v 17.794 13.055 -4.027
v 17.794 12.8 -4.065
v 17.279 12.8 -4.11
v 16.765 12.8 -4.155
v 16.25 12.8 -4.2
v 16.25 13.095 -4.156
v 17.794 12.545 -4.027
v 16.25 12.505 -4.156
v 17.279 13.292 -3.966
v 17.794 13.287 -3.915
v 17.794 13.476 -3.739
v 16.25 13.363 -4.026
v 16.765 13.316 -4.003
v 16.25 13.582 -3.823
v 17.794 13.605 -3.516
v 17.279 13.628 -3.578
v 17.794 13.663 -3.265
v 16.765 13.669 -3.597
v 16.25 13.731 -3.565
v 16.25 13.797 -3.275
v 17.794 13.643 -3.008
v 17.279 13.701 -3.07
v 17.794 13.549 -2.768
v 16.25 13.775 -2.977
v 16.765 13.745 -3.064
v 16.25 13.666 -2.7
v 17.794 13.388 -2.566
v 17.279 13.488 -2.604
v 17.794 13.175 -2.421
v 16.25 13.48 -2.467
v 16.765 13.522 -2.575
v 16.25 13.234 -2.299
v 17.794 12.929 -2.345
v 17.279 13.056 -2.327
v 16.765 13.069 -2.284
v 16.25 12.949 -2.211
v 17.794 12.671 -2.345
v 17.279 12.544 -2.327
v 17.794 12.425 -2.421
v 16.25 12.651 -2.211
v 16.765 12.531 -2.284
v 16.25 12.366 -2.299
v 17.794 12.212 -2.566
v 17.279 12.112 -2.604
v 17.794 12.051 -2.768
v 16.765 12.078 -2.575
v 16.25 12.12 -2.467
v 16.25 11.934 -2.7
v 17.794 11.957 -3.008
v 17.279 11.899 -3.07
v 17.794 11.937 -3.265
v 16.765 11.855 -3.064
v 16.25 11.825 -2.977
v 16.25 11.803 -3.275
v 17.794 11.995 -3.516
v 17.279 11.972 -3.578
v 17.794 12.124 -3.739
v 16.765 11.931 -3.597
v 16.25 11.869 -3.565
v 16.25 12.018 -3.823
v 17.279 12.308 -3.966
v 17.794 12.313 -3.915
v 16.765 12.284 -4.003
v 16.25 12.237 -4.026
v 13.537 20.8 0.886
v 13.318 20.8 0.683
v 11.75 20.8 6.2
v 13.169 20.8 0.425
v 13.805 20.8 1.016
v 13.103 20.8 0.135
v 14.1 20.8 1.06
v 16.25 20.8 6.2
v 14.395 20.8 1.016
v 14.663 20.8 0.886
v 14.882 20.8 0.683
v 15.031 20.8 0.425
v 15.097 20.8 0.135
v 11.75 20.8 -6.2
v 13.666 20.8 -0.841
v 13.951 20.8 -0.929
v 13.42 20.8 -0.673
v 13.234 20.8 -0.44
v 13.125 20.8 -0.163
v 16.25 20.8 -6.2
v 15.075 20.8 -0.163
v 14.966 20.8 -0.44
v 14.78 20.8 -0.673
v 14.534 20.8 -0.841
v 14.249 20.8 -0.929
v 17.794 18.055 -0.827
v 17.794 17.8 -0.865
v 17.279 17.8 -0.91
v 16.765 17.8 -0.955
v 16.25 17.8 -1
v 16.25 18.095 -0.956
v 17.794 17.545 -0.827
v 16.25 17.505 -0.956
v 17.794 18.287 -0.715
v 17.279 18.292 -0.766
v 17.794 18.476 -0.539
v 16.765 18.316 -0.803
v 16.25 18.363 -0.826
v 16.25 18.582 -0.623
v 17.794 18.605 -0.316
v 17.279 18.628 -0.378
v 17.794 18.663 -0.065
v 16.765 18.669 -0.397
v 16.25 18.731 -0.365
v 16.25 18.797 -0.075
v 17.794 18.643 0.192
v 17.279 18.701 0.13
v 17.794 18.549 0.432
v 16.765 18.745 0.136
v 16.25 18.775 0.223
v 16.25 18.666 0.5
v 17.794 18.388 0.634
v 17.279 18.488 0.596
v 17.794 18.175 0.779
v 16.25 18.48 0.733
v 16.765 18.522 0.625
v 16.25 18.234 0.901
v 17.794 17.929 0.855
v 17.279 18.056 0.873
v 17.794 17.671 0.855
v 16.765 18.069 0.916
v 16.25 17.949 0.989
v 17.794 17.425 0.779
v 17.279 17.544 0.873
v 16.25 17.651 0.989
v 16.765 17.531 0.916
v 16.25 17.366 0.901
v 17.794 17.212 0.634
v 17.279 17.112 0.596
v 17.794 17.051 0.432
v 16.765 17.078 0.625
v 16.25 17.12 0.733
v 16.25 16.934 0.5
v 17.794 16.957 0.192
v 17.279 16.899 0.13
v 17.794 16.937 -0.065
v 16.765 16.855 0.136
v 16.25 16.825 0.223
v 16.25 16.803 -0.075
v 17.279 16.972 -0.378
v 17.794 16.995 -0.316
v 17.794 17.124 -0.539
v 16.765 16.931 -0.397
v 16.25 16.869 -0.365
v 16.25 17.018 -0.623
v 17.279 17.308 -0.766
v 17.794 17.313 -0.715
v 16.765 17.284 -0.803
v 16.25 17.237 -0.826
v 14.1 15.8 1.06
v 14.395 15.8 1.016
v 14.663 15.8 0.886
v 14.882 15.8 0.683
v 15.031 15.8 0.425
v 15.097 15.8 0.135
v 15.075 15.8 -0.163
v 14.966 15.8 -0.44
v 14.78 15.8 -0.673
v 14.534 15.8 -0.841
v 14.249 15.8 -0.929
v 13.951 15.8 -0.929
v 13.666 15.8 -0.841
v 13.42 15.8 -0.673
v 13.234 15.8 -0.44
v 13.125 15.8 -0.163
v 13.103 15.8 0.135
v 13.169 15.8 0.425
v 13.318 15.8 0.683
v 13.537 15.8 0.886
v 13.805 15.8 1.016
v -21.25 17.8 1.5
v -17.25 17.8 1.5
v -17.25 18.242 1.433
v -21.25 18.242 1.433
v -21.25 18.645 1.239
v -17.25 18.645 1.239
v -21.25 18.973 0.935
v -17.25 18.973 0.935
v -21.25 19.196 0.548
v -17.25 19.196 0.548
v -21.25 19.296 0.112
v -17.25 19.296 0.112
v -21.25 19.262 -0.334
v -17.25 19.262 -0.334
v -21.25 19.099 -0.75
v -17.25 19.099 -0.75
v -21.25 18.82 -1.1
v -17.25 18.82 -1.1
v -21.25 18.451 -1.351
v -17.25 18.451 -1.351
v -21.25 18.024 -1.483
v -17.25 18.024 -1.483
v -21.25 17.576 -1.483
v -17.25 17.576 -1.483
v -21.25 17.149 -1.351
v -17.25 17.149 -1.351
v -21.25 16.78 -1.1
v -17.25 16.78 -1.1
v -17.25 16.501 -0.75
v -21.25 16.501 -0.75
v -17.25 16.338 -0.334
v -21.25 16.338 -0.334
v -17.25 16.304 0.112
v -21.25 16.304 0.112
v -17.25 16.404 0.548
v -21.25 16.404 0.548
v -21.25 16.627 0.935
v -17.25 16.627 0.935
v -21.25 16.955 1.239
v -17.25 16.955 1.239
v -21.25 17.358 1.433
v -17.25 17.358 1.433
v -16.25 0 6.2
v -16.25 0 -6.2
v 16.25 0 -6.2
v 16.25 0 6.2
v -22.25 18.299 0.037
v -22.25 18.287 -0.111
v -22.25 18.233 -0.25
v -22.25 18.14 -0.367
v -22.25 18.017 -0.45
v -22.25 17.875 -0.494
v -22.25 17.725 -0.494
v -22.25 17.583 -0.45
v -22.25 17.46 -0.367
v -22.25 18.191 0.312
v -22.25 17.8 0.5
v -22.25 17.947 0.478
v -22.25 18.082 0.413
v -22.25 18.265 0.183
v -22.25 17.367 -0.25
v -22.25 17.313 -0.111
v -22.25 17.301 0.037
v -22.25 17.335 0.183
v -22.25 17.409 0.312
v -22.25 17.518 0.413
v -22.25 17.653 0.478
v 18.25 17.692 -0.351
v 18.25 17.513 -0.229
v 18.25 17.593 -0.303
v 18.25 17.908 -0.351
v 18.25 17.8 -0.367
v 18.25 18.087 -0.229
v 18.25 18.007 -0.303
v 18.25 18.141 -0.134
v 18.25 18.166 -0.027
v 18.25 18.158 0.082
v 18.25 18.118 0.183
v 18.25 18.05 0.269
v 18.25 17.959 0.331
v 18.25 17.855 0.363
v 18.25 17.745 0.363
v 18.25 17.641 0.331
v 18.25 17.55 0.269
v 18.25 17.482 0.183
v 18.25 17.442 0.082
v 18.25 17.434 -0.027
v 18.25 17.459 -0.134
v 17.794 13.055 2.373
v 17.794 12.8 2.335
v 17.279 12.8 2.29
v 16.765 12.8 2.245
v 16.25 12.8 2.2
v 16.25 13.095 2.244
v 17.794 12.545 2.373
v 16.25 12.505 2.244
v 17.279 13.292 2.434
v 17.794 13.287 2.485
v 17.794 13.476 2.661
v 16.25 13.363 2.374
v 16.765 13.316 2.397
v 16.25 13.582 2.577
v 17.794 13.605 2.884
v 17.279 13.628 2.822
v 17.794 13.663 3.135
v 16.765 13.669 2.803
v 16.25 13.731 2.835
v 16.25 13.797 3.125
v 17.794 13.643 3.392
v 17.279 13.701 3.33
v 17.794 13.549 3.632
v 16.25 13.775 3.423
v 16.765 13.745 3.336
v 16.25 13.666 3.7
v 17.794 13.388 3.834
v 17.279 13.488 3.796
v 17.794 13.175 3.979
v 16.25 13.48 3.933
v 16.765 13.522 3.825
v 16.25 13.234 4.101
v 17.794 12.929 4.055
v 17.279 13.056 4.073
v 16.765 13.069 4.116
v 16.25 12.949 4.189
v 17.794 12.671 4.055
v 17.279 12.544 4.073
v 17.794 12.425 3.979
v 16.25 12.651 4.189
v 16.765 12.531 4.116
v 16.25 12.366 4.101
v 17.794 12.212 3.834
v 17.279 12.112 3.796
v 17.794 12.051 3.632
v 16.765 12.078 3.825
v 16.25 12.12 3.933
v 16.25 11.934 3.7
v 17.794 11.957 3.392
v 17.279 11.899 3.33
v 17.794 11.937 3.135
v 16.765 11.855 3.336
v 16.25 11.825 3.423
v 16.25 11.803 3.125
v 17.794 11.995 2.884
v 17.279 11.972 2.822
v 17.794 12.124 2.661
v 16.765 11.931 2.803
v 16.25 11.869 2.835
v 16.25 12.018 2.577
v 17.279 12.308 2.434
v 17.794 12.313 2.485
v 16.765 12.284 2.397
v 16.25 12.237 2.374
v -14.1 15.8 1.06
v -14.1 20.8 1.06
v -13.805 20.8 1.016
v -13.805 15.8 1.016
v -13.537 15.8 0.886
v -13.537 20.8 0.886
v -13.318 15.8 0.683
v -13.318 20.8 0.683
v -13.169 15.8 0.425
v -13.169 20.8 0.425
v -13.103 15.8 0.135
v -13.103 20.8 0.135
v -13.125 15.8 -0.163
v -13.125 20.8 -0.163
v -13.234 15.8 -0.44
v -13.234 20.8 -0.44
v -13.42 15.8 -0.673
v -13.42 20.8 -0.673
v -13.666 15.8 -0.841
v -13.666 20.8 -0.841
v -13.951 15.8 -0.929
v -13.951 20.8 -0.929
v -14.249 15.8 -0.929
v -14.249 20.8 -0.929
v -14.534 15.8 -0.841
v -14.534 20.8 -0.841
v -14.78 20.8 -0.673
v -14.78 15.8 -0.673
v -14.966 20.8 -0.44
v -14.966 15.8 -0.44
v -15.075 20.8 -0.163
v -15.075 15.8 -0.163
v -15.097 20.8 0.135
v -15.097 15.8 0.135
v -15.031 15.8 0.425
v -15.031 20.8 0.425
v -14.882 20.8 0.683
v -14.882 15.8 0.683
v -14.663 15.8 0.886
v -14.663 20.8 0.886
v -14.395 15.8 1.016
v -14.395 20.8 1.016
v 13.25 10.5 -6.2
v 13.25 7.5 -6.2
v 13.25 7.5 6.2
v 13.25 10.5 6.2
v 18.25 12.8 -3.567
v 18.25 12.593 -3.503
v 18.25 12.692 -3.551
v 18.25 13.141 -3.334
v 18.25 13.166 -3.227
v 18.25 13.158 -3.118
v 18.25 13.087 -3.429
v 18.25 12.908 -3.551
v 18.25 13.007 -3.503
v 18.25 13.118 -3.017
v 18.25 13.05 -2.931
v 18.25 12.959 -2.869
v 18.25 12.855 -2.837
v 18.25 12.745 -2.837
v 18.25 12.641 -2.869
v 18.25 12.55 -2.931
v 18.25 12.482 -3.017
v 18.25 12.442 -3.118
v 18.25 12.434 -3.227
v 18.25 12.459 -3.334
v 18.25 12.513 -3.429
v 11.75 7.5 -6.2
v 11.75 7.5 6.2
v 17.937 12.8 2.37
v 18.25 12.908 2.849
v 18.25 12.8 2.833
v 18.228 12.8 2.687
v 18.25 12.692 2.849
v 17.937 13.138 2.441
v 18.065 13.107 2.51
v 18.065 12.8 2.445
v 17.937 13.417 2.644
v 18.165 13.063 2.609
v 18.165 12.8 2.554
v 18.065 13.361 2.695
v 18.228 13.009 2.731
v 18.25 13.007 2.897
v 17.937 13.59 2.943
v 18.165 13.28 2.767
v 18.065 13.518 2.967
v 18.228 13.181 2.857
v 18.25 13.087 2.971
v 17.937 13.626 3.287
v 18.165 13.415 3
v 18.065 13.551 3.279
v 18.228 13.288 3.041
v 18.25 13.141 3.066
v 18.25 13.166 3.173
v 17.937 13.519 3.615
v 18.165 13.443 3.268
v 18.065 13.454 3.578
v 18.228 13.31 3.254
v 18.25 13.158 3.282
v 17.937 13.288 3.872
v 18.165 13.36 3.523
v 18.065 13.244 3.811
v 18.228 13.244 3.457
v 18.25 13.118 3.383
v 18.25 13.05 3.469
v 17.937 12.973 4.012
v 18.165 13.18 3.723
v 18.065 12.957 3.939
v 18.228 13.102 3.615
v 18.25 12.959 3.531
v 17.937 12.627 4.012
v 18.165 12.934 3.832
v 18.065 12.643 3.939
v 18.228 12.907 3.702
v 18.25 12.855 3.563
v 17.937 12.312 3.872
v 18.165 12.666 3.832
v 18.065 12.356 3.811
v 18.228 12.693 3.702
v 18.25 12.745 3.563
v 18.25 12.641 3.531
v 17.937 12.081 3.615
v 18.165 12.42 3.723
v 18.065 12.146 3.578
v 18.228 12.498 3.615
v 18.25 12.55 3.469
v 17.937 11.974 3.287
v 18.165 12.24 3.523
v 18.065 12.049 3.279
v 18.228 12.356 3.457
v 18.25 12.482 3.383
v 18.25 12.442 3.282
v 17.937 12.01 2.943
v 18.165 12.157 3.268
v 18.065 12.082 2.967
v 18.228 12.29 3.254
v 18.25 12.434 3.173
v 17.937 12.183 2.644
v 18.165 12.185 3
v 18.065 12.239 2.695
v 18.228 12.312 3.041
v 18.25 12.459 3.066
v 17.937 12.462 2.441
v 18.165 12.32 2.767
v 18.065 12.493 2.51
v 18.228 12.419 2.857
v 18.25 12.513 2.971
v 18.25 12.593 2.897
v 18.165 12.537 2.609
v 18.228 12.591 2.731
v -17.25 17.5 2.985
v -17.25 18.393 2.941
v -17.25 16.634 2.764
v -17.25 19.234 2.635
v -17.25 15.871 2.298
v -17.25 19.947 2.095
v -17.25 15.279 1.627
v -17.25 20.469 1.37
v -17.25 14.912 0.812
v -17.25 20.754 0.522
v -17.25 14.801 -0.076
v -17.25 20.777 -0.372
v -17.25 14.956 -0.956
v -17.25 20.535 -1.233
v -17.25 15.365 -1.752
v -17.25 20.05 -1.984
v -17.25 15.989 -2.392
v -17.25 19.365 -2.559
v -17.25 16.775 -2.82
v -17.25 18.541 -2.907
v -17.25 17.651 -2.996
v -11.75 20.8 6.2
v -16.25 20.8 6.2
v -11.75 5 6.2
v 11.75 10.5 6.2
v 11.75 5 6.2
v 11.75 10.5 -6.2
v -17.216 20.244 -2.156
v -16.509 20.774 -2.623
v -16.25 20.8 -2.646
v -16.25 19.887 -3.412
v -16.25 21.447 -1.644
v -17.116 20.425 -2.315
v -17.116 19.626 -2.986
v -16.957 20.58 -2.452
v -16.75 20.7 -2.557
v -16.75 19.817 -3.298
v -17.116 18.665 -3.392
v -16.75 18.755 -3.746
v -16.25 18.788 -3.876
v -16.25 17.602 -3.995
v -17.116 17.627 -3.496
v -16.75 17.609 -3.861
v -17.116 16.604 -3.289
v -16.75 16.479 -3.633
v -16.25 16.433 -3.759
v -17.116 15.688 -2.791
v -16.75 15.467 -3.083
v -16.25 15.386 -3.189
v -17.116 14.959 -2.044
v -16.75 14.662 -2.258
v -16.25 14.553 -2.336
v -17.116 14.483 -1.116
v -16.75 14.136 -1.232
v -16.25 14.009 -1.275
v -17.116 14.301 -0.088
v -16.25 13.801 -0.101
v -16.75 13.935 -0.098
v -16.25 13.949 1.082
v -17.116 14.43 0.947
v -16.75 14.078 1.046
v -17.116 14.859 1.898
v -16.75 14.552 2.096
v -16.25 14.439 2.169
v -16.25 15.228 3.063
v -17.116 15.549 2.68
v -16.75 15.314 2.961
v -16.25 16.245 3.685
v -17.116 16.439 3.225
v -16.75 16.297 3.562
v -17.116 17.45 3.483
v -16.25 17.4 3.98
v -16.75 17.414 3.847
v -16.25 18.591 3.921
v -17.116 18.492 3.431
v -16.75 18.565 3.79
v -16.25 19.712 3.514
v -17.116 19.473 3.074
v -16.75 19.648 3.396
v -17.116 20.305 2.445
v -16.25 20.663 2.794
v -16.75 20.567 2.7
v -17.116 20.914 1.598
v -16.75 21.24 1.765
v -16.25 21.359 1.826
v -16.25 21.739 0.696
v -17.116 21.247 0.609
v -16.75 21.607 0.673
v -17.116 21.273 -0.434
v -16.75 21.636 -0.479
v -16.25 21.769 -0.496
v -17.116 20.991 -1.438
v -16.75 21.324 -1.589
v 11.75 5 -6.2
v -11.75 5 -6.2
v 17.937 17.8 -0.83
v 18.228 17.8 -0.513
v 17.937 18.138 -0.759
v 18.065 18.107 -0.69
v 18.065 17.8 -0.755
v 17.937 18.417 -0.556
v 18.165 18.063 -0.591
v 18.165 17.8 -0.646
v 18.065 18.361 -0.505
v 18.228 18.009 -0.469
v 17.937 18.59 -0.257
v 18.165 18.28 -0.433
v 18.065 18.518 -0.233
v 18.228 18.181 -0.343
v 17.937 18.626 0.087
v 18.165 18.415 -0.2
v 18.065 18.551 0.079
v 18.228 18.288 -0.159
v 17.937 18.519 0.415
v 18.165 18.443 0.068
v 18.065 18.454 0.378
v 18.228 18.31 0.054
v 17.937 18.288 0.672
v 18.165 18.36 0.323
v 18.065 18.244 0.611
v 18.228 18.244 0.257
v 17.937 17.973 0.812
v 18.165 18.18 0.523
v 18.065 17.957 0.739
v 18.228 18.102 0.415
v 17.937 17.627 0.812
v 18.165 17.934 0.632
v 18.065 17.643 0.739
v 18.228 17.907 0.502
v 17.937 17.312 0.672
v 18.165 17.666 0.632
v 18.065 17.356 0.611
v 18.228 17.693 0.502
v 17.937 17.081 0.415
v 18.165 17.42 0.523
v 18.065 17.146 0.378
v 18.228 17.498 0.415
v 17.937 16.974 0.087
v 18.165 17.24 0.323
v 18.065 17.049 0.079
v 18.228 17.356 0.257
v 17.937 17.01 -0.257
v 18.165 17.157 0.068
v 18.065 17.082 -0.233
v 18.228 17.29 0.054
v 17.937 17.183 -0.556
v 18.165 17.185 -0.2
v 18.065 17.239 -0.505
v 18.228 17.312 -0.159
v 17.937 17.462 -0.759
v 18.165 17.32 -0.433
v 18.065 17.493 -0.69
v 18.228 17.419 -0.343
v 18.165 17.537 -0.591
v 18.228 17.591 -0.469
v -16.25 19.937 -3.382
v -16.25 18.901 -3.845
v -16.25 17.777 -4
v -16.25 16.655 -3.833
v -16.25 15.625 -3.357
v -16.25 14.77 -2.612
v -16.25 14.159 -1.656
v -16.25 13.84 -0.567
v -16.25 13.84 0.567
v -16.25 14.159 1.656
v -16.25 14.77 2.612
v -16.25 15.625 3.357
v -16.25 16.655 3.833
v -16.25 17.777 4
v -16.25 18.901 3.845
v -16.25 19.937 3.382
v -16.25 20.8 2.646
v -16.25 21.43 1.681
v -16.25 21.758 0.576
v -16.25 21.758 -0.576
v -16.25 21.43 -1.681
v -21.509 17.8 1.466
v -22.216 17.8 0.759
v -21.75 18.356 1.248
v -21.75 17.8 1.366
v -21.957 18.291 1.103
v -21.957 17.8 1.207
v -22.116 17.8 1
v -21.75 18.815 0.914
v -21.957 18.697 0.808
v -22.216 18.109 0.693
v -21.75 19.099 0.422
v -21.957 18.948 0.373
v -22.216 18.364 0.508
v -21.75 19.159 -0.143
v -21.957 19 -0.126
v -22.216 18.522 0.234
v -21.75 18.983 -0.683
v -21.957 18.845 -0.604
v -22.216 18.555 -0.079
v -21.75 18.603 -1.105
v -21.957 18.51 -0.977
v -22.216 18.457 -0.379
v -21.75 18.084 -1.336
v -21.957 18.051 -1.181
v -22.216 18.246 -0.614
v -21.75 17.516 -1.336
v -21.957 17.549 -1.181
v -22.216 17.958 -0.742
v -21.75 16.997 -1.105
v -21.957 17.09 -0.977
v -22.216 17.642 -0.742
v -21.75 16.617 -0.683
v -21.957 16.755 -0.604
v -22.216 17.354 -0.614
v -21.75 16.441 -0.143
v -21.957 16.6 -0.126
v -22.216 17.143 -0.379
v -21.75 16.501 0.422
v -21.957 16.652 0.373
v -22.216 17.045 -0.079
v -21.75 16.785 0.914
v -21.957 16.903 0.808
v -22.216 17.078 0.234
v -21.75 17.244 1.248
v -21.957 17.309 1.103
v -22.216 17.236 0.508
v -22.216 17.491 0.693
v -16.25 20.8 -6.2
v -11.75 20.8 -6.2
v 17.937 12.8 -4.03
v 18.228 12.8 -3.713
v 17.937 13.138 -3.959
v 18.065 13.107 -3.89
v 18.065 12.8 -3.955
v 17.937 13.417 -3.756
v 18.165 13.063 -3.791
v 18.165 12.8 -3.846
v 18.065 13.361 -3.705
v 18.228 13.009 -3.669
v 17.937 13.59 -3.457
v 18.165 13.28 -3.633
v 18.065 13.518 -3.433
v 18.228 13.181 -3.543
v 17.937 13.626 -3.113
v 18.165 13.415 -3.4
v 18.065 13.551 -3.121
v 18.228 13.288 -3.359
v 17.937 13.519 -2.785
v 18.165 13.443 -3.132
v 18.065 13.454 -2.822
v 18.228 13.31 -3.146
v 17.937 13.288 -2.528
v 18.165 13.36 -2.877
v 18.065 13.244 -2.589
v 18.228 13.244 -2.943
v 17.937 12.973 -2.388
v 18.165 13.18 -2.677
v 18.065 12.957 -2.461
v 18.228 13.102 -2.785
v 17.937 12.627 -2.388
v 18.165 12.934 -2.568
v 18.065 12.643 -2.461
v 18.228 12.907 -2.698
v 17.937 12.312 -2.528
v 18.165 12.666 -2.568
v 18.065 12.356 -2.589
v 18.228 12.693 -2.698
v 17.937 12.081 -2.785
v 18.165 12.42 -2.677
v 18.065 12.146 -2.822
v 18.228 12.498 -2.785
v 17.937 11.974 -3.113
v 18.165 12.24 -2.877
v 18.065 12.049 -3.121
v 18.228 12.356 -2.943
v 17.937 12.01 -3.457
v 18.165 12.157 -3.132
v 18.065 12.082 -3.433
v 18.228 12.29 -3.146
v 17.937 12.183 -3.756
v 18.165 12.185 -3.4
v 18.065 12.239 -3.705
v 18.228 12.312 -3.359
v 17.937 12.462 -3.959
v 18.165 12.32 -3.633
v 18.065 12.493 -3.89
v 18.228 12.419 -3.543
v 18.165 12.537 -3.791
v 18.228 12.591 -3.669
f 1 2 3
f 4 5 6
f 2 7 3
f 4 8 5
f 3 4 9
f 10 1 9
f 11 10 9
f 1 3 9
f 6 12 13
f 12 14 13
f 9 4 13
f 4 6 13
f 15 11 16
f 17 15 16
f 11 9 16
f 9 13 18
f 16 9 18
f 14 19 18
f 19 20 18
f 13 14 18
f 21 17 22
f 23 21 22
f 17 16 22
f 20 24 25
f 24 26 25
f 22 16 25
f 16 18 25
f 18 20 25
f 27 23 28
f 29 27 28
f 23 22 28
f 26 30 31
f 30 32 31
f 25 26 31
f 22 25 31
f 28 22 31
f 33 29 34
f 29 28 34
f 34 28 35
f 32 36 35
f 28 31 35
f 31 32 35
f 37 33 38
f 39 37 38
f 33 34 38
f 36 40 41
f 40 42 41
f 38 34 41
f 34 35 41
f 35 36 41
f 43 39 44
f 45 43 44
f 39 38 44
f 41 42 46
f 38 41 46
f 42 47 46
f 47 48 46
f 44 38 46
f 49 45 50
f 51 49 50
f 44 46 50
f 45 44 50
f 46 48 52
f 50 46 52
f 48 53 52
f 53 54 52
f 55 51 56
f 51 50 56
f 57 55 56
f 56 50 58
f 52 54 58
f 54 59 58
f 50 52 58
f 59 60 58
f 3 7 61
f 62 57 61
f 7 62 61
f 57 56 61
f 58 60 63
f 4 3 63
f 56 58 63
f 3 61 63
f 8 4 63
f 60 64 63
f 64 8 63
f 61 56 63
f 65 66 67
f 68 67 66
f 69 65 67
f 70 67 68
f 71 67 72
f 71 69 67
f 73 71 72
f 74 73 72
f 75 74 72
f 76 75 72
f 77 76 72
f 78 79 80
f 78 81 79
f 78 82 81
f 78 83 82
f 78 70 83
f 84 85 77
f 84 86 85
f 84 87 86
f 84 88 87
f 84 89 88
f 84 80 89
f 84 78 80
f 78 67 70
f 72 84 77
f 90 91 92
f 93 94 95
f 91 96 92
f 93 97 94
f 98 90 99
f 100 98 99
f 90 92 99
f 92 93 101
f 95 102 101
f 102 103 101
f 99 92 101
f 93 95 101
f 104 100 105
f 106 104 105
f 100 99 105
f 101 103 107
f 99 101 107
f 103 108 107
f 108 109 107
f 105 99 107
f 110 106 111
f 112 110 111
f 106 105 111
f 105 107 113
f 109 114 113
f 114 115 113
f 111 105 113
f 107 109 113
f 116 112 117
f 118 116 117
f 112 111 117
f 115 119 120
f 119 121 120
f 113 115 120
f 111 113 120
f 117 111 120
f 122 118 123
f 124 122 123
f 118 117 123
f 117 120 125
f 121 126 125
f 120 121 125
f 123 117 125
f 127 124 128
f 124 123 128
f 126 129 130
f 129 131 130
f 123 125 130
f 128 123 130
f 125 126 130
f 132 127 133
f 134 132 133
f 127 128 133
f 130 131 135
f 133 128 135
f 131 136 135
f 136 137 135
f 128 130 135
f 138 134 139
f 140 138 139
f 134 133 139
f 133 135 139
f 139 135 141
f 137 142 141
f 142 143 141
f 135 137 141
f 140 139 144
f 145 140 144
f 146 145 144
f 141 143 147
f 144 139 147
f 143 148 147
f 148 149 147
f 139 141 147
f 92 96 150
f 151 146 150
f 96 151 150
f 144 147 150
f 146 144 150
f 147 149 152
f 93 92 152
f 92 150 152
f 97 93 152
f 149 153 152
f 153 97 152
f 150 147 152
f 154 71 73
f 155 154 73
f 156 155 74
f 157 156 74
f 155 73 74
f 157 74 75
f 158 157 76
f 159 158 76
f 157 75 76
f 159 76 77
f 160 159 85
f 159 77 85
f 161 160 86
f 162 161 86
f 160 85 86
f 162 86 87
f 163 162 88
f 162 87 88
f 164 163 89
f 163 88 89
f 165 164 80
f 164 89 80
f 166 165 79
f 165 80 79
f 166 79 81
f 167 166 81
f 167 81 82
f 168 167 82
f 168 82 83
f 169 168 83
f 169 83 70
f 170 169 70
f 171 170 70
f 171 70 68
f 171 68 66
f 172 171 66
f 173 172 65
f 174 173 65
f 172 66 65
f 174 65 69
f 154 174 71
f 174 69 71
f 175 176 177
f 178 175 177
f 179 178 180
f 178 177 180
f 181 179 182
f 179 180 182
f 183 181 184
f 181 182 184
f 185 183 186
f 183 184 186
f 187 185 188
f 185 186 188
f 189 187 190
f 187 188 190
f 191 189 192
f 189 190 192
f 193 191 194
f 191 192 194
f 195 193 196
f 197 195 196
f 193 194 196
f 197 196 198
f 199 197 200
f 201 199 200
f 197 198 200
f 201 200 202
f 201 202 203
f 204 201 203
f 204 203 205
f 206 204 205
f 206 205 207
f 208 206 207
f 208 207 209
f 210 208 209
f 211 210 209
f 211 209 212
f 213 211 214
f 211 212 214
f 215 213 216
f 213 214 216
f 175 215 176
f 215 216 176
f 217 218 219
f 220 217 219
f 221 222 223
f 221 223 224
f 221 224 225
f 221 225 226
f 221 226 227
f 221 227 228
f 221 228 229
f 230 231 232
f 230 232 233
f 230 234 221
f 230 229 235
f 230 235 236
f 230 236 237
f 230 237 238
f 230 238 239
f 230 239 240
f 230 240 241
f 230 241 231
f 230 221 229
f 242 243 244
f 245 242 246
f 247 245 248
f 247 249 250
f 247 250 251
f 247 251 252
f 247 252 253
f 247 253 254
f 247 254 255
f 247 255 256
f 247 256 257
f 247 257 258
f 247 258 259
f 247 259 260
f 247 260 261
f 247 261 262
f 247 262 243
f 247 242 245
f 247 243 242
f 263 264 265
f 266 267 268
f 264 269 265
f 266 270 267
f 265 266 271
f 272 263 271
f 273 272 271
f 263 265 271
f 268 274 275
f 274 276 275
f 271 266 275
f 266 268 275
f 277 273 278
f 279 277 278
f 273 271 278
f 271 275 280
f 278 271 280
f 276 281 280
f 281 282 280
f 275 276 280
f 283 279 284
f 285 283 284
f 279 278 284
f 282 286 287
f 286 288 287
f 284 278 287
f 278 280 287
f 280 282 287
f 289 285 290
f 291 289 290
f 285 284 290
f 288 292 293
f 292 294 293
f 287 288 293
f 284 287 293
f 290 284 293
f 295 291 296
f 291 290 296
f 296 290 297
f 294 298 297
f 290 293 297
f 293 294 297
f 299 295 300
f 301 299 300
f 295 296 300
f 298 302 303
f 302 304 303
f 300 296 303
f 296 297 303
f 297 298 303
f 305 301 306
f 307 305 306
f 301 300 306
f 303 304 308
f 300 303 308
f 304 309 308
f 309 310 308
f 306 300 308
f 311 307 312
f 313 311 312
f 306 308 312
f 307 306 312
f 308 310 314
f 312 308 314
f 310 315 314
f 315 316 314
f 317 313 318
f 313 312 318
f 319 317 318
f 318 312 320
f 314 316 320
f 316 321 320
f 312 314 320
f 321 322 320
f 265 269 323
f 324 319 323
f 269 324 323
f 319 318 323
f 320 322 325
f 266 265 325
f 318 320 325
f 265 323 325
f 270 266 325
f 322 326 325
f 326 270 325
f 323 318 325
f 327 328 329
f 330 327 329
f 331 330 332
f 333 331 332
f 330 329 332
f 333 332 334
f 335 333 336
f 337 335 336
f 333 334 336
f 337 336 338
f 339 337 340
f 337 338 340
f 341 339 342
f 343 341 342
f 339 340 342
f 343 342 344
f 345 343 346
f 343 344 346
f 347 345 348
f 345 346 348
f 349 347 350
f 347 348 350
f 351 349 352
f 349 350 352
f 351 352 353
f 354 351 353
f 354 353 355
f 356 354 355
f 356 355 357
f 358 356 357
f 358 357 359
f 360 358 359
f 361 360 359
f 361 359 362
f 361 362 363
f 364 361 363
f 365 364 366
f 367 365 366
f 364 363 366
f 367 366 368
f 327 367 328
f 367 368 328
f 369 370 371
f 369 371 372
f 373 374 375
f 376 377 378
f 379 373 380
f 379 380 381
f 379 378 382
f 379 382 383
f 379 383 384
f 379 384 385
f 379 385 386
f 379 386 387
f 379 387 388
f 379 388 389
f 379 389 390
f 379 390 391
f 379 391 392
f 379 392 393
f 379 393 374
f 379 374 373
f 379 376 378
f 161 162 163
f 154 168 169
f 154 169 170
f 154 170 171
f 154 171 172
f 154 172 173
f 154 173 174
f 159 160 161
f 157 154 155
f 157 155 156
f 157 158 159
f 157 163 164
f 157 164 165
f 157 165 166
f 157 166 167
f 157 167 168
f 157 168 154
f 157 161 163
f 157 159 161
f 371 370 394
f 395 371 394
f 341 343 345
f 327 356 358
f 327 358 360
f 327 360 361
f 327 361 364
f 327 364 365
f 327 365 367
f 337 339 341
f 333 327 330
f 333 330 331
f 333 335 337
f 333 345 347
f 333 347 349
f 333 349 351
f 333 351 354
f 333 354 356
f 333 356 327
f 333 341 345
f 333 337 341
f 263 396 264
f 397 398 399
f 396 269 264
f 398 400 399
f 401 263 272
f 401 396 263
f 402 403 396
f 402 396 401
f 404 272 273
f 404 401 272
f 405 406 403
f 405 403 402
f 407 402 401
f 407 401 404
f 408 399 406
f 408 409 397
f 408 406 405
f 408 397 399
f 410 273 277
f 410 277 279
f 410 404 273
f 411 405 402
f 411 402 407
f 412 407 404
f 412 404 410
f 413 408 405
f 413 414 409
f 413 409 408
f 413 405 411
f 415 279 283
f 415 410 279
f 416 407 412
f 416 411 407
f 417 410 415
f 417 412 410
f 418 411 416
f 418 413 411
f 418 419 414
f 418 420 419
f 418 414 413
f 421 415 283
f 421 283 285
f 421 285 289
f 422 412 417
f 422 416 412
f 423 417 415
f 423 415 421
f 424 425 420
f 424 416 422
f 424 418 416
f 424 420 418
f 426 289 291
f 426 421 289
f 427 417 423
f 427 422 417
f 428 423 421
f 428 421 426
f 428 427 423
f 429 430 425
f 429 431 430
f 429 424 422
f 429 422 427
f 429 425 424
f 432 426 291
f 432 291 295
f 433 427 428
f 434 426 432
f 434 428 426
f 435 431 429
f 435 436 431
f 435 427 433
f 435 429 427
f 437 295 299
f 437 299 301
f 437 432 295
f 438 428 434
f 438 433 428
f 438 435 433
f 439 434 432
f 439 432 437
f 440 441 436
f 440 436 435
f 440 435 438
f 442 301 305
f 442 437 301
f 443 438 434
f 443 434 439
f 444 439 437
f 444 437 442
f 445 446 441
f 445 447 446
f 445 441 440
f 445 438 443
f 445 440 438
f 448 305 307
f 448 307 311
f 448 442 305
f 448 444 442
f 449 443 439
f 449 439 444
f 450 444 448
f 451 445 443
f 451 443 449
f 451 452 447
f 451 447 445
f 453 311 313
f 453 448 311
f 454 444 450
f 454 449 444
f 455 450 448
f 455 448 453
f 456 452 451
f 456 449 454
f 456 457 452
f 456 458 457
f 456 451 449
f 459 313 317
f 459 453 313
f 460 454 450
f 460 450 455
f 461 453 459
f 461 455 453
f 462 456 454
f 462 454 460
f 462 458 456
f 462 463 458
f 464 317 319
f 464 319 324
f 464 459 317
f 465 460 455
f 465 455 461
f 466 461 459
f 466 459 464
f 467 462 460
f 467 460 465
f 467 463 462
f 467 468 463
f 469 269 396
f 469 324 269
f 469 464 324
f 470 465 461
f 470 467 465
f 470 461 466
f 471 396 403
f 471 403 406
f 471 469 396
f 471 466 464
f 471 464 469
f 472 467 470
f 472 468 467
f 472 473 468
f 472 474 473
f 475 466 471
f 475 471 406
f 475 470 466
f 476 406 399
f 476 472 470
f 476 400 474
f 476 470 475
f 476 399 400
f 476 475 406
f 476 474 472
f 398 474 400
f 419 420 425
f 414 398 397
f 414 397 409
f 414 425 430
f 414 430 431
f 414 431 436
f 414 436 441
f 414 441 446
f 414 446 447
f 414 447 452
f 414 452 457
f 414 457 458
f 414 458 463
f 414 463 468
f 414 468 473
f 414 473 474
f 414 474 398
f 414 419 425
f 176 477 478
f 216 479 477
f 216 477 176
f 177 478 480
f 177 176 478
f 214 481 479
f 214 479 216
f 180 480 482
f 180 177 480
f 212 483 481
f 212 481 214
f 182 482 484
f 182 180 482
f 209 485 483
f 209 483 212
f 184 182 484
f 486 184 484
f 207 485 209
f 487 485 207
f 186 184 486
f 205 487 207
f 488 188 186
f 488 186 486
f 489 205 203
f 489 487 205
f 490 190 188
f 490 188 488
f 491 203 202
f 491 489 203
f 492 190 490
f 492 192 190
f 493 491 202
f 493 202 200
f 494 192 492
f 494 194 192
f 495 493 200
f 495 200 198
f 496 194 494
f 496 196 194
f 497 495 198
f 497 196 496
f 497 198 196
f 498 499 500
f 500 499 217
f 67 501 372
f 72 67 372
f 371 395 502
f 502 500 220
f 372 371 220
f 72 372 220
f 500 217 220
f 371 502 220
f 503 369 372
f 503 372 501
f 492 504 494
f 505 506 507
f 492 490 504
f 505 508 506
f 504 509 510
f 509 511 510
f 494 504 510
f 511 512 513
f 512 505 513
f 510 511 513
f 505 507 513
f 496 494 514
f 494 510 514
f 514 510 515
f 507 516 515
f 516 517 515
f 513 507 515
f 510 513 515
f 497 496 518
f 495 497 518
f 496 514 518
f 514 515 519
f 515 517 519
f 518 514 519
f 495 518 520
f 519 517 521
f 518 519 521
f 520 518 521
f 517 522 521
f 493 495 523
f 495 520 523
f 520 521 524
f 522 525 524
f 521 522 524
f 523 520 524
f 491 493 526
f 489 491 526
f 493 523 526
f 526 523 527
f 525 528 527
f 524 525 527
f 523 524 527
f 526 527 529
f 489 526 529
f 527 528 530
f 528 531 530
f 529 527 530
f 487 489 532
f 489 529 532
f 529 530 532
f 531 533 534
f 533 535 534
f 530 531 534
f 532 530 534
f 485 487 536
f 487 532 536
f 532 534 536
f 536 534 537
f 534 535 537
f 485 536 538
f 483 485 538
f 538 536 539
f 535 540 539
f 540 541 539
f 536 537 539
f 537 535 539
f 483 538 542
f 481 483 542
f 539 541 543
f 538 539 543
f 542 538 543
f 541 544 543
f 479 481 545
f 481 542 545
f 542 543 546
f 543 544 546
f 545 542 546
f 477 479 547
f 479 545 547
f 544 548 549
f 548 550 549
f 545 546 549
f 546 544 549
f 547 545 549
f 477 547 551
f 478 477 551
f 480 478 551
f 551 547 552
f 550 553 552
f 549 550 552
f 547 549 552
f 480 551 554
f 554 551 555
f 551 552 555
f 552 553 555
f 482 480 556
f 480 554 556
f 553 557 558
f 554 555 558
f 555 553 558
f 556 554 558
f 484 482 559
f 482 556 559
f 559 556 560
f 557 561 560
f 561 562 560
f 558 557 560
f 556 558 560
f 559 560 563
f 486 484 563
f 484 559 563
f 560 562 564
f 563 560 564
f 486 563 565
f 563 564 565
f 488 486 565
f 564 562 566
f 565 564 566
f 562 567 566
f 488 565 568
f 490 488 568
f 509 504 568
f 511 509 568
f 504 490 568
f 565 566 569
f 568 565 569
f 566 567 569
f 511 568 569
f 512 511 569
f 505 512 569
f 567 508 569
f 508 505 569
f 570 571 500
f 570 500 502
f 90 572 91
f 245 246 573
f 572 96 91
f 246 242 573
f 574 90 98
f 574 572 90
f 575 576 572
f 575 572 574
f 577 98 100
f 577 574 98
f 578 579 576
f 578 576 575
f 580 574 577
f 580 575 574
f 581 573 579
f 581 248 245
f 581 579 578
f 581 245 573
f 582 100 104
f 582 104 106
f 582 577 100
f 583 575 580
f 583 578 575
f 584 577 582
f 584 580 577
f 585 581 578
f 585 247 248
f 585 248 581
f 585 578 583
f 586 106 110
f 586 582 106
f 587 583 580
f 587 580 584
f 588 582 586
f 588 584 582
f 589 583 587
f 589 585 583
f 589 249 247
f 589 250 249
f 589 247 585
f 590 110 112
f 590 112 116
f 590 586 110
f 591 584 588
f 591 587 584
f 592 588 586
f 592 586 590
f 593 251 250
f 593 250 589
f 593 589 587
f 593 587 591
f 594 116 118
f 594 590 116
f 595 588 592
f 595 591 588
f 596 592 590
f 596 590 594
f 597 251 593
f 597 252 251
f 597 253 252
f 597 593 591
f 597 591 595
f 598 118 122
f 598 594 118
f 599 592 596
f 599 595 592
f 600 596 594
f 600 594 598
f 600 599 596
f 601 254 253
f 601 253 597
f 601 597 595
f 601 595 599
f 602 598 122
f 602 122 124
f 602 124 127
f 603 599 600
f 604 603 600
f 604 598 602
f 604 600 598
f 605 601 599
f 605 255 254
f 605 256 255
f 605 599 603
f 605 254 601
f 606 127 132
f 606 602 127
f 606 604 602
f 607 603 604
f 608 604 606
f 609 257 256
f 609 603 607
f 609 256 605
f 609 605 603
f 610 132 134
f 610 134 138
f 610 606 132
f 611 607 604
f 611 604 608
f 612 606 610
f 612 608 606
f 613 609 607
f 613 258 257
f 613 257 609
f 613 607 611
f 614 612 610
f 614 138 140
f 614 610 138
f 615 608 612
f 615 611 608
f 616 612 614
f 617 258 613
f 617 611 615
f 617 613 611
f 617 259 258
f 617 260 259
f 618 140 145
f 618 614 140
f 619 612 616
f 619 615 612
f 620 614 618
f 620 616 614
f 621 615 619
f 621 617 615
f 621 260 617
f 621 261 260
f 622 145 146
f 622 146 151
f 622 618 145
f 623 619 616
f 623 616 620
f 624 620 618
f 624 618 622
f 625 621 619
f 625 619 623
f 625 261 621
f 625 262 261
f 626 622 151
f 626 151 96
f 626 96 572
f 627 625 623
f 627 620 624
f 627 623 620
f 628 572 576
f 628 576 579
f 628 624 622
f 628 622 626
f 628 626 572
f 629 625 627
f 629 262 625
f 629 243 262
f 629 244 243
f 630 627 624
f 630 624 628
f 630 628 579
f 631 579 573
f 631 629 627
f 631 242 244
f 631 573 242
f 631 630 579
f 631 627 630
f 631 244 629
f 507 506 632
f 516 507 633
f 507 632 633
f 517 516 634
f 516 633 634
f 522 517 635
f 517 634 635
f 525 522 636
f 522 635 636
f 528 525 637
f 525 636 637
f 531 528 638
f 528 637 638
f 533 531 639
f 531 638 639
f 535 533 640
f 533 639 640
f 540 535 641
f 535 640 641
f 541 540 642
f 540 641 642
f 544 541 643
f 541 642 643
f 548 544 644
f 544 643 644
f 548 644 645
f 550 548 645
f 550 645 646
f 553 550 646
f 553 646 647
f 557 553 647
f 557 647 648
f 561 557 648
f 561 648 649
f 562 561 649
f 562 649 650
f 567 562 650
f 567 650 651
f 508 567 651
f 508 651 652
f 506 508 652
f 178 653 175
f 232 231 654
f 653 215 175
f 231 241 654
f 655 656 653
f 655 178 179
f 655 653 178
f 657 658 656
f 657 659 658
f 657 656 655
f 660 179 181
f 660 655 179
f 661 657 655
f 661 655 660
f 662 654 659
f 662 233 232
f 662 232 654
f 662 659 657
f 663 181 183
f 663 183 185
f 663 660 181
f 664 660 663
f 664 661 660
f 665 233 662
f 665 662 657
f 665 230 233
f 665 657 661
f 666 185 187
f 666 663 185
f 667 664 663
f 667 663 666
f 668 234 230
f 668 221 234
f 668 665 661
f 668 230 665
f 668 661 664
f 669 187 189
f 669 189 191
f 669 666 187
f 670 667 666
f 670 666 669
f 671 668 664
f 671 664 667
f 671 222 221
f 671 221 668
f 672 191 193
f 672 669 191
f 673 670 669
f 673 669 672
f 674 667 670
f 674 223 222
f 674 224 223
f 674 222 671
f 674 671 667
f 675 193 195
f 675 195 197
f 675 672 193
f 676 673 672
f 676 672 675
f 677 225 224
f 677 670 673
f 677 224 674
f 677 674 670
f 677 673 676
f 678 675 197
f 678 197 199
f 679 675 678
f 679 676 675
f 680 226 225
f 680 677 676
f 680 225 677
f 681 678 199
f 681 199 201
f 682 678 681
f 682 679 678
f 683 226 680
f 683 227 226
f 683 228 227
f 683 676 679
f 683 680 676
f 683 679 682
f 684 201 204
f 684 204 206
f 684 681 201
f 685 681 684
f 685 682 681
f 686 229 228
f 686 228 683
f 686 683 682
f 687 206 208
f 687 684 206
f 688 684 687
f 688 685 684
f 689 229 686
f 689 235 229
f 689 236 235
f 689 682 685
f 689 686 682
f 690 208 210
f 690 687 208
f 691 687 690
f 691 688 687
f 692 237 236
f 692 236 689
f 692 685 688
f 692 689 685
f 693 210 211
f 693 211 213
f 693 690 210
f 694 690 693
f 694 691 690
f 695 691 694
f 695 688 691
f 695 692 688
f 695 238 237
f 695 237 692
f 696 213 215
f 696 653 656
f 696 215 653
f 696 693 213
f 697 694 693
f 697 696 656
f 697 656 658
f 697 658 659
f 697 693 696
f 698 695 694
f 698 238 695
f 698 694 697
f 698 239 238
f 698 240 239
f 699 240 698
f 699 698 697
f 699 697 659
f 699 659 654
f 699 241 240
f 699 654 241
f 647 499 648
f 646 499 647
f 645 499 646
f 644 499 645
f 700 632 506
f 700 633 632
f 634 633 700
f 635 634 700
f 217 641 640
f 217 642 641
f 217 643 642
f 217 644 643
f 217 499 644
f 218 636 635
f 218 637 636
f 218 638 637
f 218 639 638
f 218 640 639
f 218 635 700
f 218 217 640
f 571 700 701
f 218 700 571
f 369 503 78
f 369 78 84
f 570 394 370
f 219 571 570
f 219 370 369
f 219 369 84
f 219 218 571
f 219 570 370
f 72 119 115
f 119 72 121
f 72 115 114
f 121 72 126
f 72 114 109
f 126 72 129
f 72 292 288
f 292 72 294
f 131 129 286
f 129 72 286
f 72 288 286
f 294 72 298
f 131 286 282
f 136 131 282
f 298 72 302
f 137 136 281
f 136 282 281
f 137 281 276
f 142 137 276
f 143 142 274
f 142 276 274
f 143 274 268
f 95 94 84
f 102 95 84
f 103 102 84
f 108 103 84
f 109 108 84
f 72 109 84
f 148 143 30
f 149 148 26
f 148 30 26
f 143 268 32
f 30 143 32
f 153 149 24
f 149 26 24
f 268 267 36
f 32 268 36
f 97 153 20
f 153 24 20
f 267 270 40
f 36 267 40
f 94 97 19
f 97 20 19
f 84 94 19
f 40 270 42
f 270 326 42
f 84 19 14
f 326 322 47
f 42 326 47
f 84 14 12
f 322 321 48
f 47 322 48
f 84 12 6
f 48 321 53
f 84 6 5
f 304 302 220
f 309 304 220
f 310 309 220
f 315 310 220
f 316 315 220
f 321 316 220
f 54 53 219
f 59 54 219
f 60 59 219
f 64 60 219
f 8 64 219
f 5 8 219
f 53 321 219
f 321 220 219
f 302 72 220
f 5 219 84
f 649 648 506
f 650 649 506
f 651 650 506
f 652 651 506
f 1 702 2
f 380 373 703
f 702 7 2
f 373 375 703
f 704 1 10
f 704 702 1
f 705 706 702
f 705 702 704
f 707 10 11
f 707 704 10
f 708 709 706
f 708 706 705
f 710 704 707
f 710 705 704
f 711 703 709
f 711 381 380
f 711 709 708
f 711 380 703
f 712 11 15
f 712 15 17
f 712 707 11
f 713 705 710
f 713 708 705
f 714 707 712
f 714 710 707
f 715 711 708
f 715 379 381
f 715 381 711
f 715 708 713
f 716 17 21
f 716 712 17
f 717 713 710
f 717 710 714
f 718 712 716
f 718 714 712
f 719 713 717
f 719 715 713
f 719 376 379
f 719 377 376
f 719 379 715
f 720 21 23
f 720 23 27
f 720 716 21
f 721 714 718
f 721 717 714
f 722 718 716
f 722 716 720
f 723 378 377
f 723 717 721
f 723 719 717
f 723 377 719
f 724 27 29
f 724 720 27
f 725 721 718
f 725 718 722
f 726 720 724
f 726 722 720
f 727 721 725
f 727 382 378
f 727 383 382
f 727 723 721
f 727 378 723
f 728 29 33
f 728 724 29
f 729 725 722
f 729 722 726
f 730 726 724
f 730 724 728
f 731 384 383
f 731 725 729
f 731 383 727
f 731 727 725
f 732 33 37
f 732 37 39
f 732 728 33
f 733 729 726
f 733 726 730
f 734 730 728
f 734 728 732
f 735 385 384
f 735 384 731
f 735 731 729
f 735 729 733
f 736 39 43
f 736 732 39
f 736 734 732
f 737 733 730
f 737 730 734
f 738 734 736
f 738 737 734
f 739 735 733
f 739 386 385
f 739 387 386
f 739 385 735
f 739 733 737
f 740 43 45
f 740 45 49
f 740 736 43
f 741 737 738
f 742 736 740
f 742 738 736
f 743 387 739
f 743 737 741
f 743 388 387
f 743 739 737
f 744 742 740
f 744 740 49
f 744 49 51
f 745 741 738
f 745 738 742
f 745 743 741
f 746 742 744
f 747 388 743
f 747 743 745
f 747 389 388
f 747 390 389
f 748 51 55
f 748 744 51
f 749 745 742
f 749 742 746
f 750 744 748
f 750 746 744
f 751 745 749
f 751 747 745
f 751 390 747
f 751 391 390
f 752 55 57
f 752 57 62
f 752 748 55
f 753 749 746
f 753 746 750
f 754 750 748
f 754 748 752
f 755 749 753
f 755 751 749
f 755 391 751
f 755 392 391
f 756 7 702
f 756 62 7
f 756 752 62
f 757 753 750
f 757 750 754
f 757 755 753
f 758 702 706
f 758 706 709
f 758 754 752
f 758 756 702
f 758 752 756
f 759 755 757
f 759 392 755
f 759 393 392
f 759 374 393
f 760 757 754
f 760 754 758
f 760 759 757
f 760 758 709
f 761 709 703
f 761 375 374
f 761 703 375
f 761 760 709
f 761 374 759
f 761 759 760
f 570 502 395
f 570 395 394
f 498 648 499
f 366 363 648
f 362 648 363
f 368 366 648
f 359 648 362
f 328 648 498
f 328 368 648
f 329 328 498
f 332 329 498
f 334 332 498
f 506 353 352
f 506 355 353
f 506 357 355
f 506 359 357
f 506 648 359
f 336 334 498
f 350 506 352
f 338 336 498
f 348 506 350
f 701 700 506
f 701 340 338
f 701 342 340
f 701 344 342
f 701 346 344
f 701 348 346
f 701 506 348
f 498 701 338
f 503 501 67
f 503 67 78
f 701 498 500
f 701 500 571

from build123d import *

# Parameters (mm, degrees)
SKETCH1_W                     = 32.5
SKETCH1_H                     = 12.4
BOSS_EXTRUDE1_DEPTH           = 5
SKETCH3_W                     = 4.5
SKETCH3_H                     = 12.4
BOSS_EXTRUDE2_DEPTH           = 15.8
SKETCH4_R                     = 1
CUT_EXTRUDE1_DEPTH            = 5
SKETCH5_R                     = 1
BOSS_EXTRUDE3_DEPTH           = 2
BOSS_EXTRUDE3_DRAFT           = 5
BOSS_EXTRUDE3_PROFILE_2_DEPTH = 2
BOSS_EXTRUDE3_PROFILE_2_DRAFT = 5
BOSS_EXTRUDE3_PROFILE_3_DEPTH = 2
BOSS_EXTRUDE3_PROFILE_3_DRAFT = 5
SKETCH6_R                     = 4
BOSS_EXTRUDE4_DEPTH           = 1
SKETCH7_R                     = 1.5
BOSS_EXTRUDE5_DEPTH           = 5
FILLET1_R                     = 1
FILLET2_R                     = 1
FILLET3_R                     = 0.5
SKETCH10_W                    = 1.5
SKETCH10_H                    = 3
CUT_EXTRUDE4_DEPTH            = 34.527041325


with BuildPart() as part:
    # Sketch1 → Boss-Extrude1 (new body)
    with BuildSketch(Plane(origin=(0, 0, 0), x_dir=(1, 0, 0), z_dir=(0, 1, 0))):
        Rectangle(SKETCH1_W, SKETCH1_H)
    extrude(amount=BOSS_EXTRUDE1_DEPTH)

    # Sketch3 → Boss-Extrude2 (add)
    with BuildSketch(Plane(origin=(0, 5, 0), x_dir=(1, 0, 0), z_dir=(0, 1, 0))):
        with Locations((-14, 0)):
            Rectangle(SKETCH3_W, SKETCH3_H)
        with Locations((14, 0)):
            Rectangle(SKETCH3_W, SKETCH3_H)
    extrude(amount=BOSS_EXTRUDE2_DEPTH)

    # Sketch4 → Cut-Extrude1 (cut)
    with BuildSketch(Plane(origin=(0, 20.8, 0), x_dir=(1, 0, 0), z_dir=(0, 1, 0))):
        with Locations(Location((14.1, -0.06, 0), (0, 0, 270))):
            Circle(SKETCH4_R)
        with Locations(Location((-14.1, -0.06, 0), (0, 0, 270))):
            Circle(SKETCH4_R)
    extrude(amount=-CUT_EXTRUDE1_DEPTH, mode=Mode.SUBTRACT)


with BuildPart() as boss_extrude3_tool:
    # Sketch5 → Boss-Extrude3 (with draft: the straight prism first)
    with BuildSketch(Plane(origin=(16.25, 0, 0), x_dir=(0, 0, -1), z_dir=(1, 0, 0))):
        with Locations((0, 17.8)):
            Circle(SKETCH5_R)
    extrude(amount=BOSS_EXTRUDE3_DEPTH)
    # Boss-Extrude3: the draft: its side faces are tilted about the plane it starts from
    boss_extrude3_sides = [boss_extrude3_tool.faces().sort_by_distance(p)[0] for p in [
        (17.25, 17.8, 1),
    ]]
    draft(boss_extrude3_sides, Plane(origin=(16.25, 0, 0), x_dir=(0, 0, -1), z_dir=(1, 0, 0)), BOSS_EXTRUDE3_DRAFT)


with BuildPart() as part_1:
    add(part.part)

    # Boss-Extrude3: add boss_extrude3_tool
    add(boss_extrude3_tool.part)


with BuildPart() as boss_extrude3_profile_2_tool:
    # Sketch5 → Boss-Extrude3 profile 2 (with draft: the straight prism first)
    with BuildSketch(Plane(origin=(16.25, 0, 0), x_dir=(0, 0, -1), z_dir=(1, 0, 0))):
        with Locations((3.2, 12.8)):
            Circle(SKETCH5_R)
    extrude(amount=BOSS_EXTRUDE3_PROFILE_2_DEPTH)
    # Boss-Extrude3 profile 2: the draft: its side faces are tilted about the plane it starts from
    boss_extrude3_profile_2_sides = [boss_extrude3_profile_2_tool.faces().sort_by_distance(p)[0] for p in [
        (17.25, 12.8, -2.2),
    ]]
    draft(boss_extrude3_profile_2_sides, Plane(origin=(16.25, 0, 0), x_dir=(0, 0, -1), z_dir=(1, 0, 0)), BOSS_EXTRUDE3_PROFILE_2_DRAFT)


with BuildPart() as part_2:
    add(part_1.part)

    # Boss-Extrude3 profile 2: add boss_extrude3_profile_2_tool
    add(boss_extrude3_profile_2_tool.part)


with BuildPart() as boss_extrude3_profile_3_tool:
    # Sketch5 → Boss-Extrude3 profile 3 (with draft: the straight prism first)
    with BuildSketch(Plane(origin=(16.25, 0, 0), x_dir=(0, 0, -1), z_dir=(1, 0, 0))):
        with Locations((-3.2, 12.8)):
            Circle(SKETCH5_R)
    extrude(amount=BOSS_EXTRUDE3_PROFILE_3_DEPTH)
    # Boss-Extrude3 profile 3: the draft: its side faces are tilted about the plane it starts from
    boss_extrude3_profile_3_sides = [boss_extrude3_profile_3_tool.faces().sort_by_distance(p)[0] for p in [
        (17.25, 12.8, 4.2),
    ]]
    draft(boss_extrude3_profile_3_sides, Plane(origin=(16.25, 0, 0), x_dir=(0, 0, -1), z_dir=(1, 0, 0)), BOSS_EXTRUDE3_PROFILE_3_DRAFT)


with BuildPart() as part_3:
    add(part_2.part)

    # Boss-Extrude3 profile 3: add boss_extrude3_profile_3_tool
    add(boss_extrude3_profile_3_tool.part)

    # Sketch6 → Boss-Extrude4 (add)
    with BuildSketch(Plane.ZY.offset(16.25)):
        with Locations(Location((0, 17.8, 0), (0, 0, 131.409622109))):
            Circle(SKETCH6_R)
    extrude(amount=BOSS_EXTRUDE4_DEPTH)

    # Sketch7 → Boss-Extrude5 (add)
    with BuildSketch(Plane.ZY.offset(17.25)):
        with Locations((0, 17.8)):
            Circle(SKETCH7_R)
    extrude(amount=BOSS_EXTRUDE5_DEPTH)

    # Fillet1
    fillet1_edges = [part_3.edges().sort_by_distance(p)[0] for p in [
        (-22.25, 17.8, -1.5),
    ]]
    fillet(fillet1_edges, radius=FILLET1_R)

    # Fillet2
    fillet2_edges = [part_3.edges().sort_by_distance(p)[0] for p in [
        (-17.25, 14.8, 2.645751311),
    ]]
    fillet(fillet2_edges, radius=FILLET2_R - 0.0001)  # a hair under: the kernel refuses the full size

    # Fillet3
    fillet3_edges = [part_3.edges().sort_by_distance(p)[0] for p in [
        (18.25, 17.8, 0.825022673),
        (18.25, 12.8, -2.374977327),
        (18.25, 12.8, 4.025022673),
    ]]
    fillet(fillet3_edges, radius=FILLET3_R)

    # Sketch10 → Cut-Extrude4 (cut, through all)
    with BuildSketch(Plane(origin=(0, 0, -6.2), x_dir=(-1, 0, 0), z_dir=(0, 0, -1))):
        with Locations((-12.5, 9)):
            Rectangle(SKETCH10_W, SKETCH10_H)
    extrude(amount=-CUT_EXTRUDE4_DEPTH, mode=Mode.SUBTRACT)


solid = part_3.part
